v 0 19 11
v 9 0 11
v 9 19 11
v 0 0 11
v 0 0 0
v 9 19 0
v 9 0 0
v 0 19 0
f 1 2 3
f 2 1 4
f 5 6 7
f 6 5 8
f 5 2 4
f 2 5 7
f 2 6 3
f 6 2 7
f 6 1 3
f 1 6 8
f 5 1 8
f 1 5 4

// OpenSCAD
// Generated by SolidPython 1.0.1 on 2020-07-29 00:46:55


cube(size = [9, 19, 11]);
/***********************************************
*********      SolidPython code:      **********
************************************************
 
# import packages: SolidPython
from solid import *
from solid.utils import *
from itertools import chain, combinations, permutations


class Resize:

    def __init__(self, scad_file):
        self.scad_file = scad_file
        #self.scad_file = import_scad(scad_file)
        # cone/cylinder param:
        self.r1 = 0
        self.r2 = 0
        self.h = 0
        # rectangular prism param:
        self.w = 0
        self.l = 0
        # ellipse param:
        self.r = 0

    # import OpenScad code (file name corresponds to shape)


    # classify shape + parameters
    def assign(self, param1, param2, param3):
        if self.scad_file == 'cone.scad':
            self.r1 = param1
            self.r2 = param2
            self.h = param3
        elif self.scad_file == 'cylinder.scad':
            self.r1 = param1
            self.r2 = param2
            self.h = param3
        elif self.scad_file == 'rectangularPrism.scad':
            self.h = param1
            self.l = param2
            self.w = param3
        else:
            self.r = param1
            self.h = param2

    # resize parameters
    def iterate(self):
        x = range(3, 20, 2)
        i = 1
        if self.scad_file == 'cone.scad':
            tempList = list(permutations(x, 2))
            for temp in tempList:
                param1 = temp[0]
                param2 = temp[1]
                filepath = 'produced_scad_files/' + 'cone' + str(param1) + '_' + str(param2) + '_' + '.scad'
                scad_render_to_file(cylinder(h=param1, r1=param2, r2=0), filepath)

        elif self.scad_file == 'cylinder.scad':
            tempList = list(permutations(x, 3))
            for temp in tempList:
                param1 = temp[0]
                param2 = temp[1]
                filepath = 'produced_scad_files/' + 'cylinder' + str(param1) + '_' + str(param2) + '_' + '.scad'
                scad_render_to_file(cylinder(h=param1, r1=param2, r2=param2), filepath)

        elif self.scad_file == 'rectangularPrism.scad':
            tempList = list(permutations(x, 3))
            for temp in tempList:
                param1 = temp[0]
                param2 = temp[1]
                param3 = temp[2]
                filepath = 'produced_scad_files/' + 'rectangularPrism' + str(param1) + '_' + str(param2) + '_' + str(
                    param3) + '.scad'
                scad_render_to_file(cube(size=(param1, param2, param3)), filepath)

        elif self.scad_file == 'ellipse.scad':
            tempList = list(permutations(x, 4))
            for temp in tempList:
                param1 = temp[0]
                param2 = temp[1]
                param3 = temp[2]
                param4 = temp[3]
                filepath = 'produced_scad_files/' + 'ellipse' + str(param1) + '_' + str(param2) + '_' + str(param3) + '_' + str(param4) + '.scad'
                scad_render_to_file(scale([param1, param2, param3])(sphere(r=param4)), filepath)

    def render_to_scadfile(self):
        scad_render_to_file(scad, 'example.scad') 
 
************************************************/
